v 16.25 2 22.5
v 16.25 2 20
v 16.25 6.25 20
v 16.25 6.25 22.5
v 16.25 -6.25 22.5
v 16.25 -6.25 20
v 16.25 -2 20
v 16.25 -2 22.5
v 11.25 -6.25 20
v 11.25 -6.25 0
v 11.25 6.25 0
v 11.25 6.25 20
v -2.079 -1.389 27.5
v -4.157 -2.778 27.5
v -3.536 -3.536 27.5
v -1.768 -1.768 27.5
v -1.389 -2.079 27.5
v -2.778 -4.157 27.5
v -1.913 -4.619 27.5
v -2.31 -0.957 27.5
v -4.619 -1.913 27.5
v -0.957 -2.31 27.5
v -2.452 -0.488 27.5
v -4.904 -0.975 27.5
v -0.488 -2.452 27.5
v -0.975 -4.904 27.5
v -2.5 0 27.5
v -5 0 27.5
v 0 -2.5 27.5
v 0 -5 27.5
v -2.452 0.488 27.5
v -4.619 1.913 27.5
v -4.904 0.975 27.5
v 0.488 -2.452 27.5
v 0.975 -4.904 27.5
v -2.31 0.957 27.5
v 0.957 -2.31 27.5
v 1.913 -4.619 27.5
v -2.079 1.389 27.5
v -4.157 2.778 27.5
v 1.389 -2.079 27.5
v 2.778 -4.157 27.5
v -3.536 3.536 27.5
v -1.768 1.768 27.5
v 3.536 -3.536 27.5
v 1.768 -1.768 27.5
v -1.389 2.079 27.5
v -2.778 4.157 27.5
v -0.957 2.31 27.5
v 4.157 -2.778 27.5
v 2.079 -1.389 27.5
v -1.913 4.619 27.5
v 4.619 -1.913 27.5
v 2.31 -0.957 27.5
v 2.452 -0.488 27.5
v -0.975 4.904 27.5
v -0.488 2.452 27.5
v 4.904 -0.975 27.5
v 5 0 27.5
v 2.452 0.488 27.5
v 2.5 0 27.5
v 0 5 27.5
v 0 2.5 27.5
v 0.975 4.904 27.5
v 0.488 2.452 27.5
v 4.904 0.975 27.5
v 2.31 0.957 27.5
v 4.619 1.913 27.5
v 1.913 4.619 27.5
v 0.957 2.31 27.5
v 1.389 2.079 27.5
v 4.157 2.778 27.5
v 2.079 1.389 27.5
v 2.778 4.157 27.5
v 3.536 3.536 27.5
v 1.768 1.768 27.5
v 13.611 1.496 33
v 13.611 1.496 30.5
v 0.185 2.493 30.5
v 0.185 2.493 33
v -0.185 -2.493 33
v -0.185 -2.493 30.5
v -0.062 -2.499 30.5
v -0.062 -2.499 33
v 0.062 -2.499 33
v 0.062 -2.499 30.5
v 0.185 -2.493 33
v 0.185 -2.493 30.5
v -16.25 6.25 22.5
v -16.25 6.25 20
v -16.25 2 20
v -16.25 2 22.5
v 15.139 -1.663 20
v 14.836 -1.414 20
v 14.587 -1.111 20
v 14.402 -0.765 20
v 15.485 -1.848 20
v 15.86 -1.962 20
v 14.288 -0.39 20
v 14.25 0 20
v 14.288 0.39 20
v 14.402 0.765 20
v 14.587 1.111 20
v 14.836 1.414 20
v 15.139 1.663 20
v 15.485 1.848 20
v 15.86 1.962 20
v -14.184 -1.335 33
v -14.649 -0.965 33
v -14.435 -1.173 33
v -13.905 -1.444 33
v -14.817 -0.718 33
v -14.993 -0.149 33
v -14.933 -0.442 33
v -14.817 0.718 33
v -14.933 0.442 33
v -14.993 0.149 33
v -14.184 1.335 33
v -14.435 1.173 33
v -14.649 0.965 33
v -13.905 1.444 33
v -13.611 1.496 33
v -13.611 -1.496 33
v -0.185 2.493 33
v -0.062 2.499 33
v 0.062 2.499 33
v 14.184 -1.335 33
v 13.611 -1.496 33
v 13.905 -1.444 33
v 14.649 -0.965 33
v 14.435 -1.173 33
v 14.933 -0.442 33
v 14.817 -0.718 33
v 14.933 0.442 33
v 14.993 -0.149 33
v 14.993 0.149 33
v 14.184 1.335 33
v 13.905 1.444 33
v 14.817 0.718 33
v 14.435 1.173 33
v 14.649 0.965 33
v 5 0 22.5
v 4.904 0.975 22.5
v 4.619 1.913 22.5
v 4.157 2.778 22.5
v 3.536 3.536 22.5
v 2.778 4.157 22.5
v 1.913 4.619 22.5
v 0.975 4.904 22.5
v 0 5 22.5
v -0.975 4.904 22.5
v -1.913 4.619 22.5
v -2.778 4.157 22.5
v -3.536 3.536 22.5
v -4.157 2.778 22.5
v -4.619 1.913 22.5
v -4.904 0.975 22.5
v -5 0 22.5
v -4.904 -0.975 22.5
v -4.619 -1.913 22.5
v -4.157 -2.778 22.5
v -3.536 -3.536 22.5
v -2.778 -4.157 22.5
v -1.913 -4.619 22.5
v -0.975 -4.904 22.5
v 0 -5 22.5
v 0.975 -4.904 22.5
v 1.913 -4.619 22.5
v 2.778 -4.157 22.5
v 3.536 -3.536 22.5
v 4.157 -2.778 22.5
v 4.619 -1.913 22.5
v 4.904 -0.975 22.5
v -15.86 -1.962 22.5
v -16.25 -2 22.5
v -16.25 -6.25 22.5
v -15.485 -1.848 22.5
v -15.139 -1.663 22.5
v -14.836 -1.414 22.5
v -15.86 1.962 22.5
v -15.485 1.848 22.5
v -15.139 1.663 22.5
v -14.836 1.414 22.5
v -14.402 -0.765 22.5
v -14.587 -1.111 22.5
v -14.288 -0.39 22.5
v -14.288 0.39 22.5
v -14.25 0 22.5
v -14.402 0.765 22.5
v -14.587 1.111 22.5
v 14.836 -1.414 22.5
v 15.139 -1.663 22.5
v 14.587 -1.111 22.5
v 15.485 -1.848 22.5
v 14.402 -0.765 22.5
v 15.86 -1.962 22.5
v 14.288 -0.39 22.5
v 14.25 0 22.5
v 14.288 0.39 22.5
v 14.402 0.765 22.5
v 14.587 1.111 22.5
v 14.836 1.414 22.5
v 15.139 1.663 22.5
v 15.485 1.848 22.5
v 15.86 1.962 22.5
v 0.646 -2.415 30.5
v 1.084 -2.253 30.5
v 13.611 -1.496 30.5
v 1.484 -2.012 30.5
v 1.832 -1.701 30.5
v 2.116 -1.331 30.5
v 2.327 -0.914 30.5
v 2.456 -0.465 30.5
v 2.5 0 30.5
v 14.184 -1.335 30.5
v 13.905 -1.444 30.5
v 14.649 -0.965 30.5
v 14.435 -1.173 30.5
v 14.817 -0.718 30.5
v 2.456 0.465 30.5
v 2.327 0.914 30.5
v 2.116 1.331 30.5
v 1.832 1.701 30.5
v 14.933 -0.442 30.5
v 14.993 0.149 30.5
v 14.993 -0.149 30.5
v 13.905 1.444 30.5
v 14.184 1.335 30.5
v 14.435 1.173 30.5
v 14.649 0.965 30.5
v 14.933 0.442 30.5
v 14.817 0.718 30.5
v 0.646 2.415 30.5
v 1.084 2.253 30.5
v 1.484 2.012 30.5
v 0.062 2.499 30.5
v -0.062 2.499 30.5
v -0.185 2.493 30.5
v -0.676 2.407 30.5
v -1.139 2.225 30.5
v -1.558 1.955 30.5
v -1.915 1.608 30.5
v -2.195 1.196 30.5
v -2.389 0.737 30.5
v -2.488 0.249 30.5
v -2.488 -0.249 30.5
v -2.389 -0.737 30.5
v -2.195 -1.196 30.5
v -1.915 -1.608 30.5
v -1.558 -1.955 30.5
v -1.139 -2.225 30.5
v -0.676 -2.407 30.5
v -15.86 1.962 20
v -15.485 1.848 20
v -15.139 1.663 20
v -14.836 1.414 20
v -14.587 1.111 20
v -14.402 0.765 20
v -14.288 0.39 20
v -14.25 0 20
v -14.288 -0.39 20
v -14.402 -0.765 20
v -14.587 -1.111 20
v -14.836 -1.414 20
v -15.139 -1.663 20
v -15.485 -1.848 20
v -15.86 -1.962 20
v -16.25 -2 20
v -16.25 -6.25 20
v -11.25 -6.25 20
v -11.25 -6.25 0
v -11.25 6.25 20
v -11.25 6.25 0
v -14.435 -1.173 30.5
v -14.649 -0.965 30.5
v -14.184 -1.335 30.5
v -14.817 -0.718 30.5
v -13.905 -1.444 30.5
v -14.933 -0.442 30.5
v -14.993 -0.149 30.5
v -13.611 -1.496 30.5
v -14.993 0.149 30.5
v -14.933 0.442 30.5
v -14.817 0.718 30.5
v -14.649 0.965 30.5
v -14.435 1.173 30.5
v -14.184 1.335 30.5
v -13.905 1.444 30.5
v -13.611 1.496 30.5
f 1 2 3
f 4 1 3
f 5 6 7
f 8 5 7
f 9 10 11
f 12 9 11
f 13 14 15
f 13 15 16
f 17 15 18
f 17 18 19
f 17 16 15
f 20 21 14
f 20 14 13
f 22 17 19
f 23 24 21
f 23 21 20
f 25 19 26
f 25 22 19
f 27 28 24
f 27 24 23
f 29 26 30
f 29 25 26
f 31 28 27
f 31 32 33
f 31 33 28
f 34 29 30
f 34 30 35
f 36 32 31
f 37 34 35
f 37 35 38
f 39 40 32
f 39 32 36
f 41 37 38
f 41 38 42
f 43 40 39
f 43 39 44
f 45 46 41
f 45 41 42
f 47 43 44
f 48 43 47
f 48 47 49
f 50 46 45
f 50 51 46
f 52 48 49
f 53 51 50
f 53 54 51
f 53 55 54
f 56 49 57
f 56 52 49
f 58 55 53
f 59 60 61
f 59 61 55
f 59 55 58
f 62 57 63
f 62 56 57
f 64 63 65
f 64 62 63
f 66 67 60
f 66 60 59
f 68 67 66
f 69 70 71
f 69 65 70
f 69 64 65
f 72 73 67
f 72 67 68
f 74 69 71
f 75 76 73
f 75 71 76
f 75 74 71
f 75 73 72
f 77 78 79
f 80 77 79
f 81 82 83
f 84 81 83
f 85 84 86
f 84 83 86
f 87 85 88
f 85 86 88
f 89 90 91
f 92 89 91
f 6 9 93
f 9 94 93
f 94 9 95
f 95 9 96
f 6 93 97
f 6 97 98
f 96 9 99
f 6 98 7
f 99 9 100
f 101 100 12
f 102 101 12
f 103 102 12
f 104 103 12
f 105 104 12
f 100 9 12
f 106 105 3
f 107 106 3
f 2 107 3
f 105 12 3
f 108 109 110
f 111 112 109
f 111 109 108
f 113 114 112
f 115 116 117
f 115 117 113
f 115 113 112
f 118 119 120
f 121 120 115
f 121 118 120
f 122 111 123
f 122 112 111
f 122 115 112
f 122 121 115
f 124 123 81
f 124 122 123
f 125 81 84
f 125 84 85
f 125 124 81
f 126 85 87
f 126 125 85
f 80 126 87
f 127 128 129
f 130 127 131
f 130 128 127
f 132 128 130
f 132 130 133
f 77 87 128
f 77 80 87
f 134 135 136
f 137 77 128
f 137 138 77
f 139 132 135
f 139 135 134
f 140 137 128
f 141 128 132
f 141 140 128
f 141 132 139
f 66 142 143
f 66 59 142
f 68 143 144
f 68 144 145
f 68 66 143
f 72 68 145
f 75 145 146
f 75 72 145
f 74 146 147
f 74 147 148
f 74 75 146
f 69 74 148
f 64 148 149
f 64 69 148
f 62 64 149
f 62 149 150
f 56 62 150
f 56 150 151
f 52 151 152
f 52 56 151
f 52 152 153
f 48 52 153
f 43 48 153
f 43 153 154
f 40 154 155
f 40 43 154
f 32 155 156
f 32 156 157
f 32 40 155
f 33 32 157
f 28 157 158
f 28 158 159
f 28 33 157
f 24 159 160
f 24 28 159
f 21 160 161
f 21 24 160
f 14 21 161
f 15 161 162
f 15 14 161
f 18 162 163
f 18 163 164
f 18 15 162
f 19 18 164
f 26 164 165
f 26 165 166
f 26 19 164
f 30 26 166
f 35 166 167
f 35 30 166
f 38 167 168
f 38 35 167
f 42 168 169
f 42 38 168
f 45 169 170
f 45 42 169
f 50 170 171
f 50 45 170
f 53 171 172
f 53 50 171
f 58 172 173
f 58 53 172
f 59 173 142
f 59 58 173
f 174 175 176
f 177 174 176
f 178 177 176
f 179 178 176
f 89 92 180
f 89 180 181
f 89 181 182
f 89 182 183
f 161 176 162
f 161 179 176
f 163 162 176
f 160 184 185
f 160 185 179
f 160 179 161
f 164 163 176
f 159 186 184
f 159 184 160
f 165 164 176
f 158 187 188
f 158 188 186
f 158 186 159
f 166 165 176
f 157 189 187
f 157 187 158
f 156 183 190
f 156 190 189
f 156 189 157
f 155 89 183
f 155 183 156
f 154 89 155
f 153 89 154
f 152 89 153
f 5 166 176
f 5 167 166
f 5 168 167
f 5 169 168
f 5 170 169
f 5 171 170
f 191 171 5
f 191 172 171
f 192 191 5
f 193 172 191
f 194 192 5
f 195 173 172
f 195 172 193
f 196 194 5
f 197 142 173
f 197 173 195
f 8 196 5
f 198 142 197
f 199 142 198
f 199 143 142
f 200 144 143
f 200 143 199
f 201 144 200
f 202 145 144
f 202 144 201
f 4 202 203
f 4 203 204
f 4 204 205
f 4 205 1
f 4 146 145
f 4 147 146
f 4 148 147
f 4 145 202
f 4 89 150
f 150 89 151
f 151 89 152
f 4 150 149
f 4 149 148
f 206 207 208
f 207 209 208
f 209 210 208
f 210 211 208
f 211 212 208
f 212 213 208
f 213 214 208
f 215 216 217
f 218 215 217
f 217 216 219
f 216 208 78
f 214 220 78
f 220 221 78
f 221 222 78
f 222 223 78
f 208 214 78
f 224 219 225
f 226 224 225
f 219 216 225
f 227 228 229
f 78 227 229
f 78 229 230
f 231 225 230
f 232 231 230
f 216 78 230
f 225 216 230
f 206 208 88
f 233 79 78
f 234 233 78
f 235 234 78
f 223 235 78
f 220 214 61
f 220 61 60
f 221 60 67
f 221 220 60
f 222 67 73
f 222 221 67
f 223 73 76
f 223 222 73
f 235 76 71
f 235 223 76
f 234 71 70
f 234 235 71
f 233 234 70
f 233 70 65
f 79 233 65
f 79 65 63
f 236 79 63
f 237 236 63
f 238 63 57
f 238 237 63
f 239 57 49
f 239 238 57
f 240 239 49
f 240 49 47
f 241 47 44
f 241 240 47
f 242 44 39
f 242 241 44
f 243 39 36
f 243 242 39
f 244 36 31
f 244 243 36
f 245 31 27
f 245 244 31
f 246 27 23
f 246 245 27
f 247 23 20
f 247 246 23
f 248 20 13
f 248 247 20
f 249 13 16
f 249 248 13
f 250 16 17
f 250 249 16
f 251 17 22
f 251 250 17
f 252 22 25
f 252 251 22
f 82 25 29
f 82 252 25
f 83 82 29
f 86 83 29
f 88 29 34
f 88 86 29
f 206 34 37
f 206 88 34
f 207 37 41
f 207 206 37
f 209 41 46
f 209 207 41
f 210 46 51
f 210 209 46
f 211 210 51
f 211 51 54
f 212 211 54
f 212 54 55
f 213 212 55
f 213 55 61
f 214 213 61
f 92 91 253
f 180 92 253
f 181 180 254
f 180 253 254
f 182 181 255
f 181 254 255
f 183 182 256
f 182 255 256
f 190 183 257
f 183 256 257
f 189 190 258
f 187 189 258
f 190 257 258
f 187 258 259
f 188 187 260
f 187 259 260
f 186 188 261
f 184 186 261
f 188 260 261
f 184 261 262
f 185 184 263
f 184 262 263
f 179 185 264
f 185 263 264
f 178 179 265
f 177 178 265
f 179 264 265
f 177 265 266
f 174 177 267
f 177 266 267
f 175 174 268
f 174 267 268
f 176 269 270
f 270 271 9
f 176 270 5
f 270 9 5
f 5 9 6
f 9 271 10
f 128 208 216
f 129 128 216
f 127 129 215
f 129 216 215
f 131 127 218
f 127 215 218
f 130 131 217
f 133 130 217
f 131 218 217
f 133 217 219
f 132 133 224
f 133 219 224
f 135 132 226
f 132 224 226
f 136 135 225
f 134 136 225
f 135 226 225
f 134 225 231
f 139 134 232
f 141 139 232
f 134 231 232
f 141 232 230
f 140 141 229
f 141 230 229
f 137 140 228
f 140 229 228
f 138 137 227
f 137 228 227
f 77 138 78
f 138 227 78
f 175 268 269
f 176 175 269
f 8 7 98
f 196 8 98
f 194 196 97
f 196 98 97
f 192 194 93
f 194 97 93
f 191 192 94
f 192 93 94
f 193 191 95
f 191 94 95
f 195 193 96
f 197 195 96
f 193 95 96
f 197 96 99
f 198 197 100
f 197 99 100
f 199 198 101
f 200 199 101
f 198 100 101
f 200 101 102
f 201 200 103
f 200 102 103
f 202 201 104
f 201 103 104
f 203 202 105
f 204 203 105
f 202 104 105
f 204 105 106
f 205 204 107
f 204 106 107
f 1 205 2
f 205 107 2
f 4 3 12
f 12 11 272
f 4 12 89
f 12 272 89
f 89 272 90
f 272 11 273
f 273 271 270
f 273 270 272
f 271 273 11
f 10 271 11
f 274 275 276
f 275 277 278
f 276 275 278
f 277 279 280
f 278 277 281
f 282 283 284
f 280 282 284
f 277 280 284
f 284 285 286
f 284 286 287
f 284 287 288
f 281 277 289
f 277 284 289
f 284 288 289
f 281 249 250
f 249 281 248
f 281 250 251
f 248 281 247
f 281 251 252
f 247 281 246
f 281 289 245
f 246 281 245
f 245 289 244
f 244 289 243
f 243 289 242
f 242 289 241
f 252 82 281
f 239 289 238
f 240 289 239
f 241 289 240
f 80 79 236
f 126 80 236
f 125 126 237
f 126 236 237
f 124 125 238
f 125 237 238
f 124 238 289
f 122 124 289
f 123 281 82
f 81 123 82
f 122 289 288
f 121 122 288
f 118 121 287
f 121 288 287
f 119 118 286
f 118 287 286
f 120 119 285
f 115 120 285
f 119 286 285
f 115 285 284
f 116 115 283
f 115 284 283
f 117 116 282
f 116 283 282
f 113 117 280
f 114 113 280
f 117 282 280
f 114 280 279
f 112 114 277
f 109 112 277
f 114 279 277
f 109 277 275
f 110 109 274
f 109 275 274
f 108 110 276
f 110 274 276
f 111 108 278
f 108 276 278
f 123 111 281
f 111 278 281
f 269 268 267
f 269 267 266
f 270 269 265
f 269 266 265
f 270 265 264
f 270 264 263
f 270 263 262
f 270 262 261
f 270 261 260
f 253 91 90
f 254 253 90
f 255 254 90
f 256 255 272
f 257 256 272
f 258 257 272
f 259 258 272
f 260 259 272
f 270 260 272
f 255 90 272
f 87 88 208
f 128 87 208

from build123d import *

# Parameters (mm, degrees)
F0_W     = 22.5
F0_H     = 12.5
F1_DEPTH = 20
F3_DEPTH = 2.5
F6_R     = 1.47809988
F7_DEPTH = 2.5


with BuildPart() as f1:
    # F0 (on Top) → F1 (new body)
    with BuildSketch(Plane.XY):
        Rectangle(F0_W, F0_H)
    extrude(amount=F1_DEPTH)

    # F2 (on face) → F3 (join)
    with BuildSketch(Plane.XY.offset(20)):
        with BuildLine():
            Line((16.25, 2), (16.25, 6.25))
            Line((16.25, 6.25), (-16.25, 6.25))
            Line((-16.25, 6.25), (-16.25, 2))
            ThreePointArc((-16.25, 2), (-14.25, 0), (-16.25, -2))
            Line((-16.25, -2), (-16.25, -6.25))
            Line((-16.25, -6.25), (16.25, -6.25))
            Line((16.25, -6.25), (16.25, -2))
            ThreePointArc((16.25, -2), (14.25, 0), (16.25, 2))
        make_face()
    extrude(amount=F3_DEPTH)

    # F4 (on Front) → F5 (revolve)
    with BuildSketch(Plane.XZ):
        Polygon((0, 22.5), (5, 22.5), (5, 27.5), (2.5, 27.5), (2.5, 30.5), (0, 30.5), align=None)
    revolve(axis=Axis((0, 0, 26.5), (0, 0, 1)))

    # F6 (on face) → F7 (join)
    with BuildSketch(Plane.XY.offset(30.5)):
        with BuildLine():
            Line((0.1851851852, -2.4931318552), (13.6111111111, -1.4958791131))
            ThreePointArc((13.6111111111, -1.4958791131), (15, 0), (13.6111111111, 1.4958791131))
            Line((13.6111111111, 1.4958791131), (0.1851851852, 2.4931318552))
            ThreePointArc((0.1851851852, 2.4931318552), (1.832070272, 1.7010345436), (2.5, 0))
            ThreePointArc((2.5, 0), (1.832070272, -1.7010345436), (0.1851851852, -2.4931318552))
        make_face()
        with BuildLine():
            ThreePointArc((-0.1851851852, -2.4931318552), (0, -2.5), (0.1851851852, -2.4931318552))
            ThreePointArc((0.1851851852, -2.4931318552), (1.832070272, -1.7010345436), (2.5, 0))
            ThreePointArc((2.5, 0), (1.832070272, 1.7010345436), (0.1851851852, 2.4931318552))
            ThreePointArc((0.1851851852, 2.4931318552), (0, 2.5), (-0.1851851852, 2.4931318552))
            ThreePointArc((-0.1851851852, 2.4931318552), (-2.5, 0), (-0.1851851852, -2.4931318552))
        make_face()
        Circle(F6_R, mode=Mode.SUBTRACT)
        with BuildLine():
            Line((-13.6111111111, -1.4958791131), (-0.1851851852, -2.4931318552))
            ThreePointArc((-0.1851851852, -2.4931318552), (-2.5, 0), (-0.1851851852, 2.4931318552))
            Line((-0.1851851852, 2.4931318552), (-13.6111111111, 1.4958791131))
            ThreePointArc((-13.6111111111, 1.4958791131), (-15, 0), (-13.6111111111, -1.4958791131))
        make_face()
        Circle(F6_R)
    extrude(amount=F7_DEPTH)


solid = f1.part
